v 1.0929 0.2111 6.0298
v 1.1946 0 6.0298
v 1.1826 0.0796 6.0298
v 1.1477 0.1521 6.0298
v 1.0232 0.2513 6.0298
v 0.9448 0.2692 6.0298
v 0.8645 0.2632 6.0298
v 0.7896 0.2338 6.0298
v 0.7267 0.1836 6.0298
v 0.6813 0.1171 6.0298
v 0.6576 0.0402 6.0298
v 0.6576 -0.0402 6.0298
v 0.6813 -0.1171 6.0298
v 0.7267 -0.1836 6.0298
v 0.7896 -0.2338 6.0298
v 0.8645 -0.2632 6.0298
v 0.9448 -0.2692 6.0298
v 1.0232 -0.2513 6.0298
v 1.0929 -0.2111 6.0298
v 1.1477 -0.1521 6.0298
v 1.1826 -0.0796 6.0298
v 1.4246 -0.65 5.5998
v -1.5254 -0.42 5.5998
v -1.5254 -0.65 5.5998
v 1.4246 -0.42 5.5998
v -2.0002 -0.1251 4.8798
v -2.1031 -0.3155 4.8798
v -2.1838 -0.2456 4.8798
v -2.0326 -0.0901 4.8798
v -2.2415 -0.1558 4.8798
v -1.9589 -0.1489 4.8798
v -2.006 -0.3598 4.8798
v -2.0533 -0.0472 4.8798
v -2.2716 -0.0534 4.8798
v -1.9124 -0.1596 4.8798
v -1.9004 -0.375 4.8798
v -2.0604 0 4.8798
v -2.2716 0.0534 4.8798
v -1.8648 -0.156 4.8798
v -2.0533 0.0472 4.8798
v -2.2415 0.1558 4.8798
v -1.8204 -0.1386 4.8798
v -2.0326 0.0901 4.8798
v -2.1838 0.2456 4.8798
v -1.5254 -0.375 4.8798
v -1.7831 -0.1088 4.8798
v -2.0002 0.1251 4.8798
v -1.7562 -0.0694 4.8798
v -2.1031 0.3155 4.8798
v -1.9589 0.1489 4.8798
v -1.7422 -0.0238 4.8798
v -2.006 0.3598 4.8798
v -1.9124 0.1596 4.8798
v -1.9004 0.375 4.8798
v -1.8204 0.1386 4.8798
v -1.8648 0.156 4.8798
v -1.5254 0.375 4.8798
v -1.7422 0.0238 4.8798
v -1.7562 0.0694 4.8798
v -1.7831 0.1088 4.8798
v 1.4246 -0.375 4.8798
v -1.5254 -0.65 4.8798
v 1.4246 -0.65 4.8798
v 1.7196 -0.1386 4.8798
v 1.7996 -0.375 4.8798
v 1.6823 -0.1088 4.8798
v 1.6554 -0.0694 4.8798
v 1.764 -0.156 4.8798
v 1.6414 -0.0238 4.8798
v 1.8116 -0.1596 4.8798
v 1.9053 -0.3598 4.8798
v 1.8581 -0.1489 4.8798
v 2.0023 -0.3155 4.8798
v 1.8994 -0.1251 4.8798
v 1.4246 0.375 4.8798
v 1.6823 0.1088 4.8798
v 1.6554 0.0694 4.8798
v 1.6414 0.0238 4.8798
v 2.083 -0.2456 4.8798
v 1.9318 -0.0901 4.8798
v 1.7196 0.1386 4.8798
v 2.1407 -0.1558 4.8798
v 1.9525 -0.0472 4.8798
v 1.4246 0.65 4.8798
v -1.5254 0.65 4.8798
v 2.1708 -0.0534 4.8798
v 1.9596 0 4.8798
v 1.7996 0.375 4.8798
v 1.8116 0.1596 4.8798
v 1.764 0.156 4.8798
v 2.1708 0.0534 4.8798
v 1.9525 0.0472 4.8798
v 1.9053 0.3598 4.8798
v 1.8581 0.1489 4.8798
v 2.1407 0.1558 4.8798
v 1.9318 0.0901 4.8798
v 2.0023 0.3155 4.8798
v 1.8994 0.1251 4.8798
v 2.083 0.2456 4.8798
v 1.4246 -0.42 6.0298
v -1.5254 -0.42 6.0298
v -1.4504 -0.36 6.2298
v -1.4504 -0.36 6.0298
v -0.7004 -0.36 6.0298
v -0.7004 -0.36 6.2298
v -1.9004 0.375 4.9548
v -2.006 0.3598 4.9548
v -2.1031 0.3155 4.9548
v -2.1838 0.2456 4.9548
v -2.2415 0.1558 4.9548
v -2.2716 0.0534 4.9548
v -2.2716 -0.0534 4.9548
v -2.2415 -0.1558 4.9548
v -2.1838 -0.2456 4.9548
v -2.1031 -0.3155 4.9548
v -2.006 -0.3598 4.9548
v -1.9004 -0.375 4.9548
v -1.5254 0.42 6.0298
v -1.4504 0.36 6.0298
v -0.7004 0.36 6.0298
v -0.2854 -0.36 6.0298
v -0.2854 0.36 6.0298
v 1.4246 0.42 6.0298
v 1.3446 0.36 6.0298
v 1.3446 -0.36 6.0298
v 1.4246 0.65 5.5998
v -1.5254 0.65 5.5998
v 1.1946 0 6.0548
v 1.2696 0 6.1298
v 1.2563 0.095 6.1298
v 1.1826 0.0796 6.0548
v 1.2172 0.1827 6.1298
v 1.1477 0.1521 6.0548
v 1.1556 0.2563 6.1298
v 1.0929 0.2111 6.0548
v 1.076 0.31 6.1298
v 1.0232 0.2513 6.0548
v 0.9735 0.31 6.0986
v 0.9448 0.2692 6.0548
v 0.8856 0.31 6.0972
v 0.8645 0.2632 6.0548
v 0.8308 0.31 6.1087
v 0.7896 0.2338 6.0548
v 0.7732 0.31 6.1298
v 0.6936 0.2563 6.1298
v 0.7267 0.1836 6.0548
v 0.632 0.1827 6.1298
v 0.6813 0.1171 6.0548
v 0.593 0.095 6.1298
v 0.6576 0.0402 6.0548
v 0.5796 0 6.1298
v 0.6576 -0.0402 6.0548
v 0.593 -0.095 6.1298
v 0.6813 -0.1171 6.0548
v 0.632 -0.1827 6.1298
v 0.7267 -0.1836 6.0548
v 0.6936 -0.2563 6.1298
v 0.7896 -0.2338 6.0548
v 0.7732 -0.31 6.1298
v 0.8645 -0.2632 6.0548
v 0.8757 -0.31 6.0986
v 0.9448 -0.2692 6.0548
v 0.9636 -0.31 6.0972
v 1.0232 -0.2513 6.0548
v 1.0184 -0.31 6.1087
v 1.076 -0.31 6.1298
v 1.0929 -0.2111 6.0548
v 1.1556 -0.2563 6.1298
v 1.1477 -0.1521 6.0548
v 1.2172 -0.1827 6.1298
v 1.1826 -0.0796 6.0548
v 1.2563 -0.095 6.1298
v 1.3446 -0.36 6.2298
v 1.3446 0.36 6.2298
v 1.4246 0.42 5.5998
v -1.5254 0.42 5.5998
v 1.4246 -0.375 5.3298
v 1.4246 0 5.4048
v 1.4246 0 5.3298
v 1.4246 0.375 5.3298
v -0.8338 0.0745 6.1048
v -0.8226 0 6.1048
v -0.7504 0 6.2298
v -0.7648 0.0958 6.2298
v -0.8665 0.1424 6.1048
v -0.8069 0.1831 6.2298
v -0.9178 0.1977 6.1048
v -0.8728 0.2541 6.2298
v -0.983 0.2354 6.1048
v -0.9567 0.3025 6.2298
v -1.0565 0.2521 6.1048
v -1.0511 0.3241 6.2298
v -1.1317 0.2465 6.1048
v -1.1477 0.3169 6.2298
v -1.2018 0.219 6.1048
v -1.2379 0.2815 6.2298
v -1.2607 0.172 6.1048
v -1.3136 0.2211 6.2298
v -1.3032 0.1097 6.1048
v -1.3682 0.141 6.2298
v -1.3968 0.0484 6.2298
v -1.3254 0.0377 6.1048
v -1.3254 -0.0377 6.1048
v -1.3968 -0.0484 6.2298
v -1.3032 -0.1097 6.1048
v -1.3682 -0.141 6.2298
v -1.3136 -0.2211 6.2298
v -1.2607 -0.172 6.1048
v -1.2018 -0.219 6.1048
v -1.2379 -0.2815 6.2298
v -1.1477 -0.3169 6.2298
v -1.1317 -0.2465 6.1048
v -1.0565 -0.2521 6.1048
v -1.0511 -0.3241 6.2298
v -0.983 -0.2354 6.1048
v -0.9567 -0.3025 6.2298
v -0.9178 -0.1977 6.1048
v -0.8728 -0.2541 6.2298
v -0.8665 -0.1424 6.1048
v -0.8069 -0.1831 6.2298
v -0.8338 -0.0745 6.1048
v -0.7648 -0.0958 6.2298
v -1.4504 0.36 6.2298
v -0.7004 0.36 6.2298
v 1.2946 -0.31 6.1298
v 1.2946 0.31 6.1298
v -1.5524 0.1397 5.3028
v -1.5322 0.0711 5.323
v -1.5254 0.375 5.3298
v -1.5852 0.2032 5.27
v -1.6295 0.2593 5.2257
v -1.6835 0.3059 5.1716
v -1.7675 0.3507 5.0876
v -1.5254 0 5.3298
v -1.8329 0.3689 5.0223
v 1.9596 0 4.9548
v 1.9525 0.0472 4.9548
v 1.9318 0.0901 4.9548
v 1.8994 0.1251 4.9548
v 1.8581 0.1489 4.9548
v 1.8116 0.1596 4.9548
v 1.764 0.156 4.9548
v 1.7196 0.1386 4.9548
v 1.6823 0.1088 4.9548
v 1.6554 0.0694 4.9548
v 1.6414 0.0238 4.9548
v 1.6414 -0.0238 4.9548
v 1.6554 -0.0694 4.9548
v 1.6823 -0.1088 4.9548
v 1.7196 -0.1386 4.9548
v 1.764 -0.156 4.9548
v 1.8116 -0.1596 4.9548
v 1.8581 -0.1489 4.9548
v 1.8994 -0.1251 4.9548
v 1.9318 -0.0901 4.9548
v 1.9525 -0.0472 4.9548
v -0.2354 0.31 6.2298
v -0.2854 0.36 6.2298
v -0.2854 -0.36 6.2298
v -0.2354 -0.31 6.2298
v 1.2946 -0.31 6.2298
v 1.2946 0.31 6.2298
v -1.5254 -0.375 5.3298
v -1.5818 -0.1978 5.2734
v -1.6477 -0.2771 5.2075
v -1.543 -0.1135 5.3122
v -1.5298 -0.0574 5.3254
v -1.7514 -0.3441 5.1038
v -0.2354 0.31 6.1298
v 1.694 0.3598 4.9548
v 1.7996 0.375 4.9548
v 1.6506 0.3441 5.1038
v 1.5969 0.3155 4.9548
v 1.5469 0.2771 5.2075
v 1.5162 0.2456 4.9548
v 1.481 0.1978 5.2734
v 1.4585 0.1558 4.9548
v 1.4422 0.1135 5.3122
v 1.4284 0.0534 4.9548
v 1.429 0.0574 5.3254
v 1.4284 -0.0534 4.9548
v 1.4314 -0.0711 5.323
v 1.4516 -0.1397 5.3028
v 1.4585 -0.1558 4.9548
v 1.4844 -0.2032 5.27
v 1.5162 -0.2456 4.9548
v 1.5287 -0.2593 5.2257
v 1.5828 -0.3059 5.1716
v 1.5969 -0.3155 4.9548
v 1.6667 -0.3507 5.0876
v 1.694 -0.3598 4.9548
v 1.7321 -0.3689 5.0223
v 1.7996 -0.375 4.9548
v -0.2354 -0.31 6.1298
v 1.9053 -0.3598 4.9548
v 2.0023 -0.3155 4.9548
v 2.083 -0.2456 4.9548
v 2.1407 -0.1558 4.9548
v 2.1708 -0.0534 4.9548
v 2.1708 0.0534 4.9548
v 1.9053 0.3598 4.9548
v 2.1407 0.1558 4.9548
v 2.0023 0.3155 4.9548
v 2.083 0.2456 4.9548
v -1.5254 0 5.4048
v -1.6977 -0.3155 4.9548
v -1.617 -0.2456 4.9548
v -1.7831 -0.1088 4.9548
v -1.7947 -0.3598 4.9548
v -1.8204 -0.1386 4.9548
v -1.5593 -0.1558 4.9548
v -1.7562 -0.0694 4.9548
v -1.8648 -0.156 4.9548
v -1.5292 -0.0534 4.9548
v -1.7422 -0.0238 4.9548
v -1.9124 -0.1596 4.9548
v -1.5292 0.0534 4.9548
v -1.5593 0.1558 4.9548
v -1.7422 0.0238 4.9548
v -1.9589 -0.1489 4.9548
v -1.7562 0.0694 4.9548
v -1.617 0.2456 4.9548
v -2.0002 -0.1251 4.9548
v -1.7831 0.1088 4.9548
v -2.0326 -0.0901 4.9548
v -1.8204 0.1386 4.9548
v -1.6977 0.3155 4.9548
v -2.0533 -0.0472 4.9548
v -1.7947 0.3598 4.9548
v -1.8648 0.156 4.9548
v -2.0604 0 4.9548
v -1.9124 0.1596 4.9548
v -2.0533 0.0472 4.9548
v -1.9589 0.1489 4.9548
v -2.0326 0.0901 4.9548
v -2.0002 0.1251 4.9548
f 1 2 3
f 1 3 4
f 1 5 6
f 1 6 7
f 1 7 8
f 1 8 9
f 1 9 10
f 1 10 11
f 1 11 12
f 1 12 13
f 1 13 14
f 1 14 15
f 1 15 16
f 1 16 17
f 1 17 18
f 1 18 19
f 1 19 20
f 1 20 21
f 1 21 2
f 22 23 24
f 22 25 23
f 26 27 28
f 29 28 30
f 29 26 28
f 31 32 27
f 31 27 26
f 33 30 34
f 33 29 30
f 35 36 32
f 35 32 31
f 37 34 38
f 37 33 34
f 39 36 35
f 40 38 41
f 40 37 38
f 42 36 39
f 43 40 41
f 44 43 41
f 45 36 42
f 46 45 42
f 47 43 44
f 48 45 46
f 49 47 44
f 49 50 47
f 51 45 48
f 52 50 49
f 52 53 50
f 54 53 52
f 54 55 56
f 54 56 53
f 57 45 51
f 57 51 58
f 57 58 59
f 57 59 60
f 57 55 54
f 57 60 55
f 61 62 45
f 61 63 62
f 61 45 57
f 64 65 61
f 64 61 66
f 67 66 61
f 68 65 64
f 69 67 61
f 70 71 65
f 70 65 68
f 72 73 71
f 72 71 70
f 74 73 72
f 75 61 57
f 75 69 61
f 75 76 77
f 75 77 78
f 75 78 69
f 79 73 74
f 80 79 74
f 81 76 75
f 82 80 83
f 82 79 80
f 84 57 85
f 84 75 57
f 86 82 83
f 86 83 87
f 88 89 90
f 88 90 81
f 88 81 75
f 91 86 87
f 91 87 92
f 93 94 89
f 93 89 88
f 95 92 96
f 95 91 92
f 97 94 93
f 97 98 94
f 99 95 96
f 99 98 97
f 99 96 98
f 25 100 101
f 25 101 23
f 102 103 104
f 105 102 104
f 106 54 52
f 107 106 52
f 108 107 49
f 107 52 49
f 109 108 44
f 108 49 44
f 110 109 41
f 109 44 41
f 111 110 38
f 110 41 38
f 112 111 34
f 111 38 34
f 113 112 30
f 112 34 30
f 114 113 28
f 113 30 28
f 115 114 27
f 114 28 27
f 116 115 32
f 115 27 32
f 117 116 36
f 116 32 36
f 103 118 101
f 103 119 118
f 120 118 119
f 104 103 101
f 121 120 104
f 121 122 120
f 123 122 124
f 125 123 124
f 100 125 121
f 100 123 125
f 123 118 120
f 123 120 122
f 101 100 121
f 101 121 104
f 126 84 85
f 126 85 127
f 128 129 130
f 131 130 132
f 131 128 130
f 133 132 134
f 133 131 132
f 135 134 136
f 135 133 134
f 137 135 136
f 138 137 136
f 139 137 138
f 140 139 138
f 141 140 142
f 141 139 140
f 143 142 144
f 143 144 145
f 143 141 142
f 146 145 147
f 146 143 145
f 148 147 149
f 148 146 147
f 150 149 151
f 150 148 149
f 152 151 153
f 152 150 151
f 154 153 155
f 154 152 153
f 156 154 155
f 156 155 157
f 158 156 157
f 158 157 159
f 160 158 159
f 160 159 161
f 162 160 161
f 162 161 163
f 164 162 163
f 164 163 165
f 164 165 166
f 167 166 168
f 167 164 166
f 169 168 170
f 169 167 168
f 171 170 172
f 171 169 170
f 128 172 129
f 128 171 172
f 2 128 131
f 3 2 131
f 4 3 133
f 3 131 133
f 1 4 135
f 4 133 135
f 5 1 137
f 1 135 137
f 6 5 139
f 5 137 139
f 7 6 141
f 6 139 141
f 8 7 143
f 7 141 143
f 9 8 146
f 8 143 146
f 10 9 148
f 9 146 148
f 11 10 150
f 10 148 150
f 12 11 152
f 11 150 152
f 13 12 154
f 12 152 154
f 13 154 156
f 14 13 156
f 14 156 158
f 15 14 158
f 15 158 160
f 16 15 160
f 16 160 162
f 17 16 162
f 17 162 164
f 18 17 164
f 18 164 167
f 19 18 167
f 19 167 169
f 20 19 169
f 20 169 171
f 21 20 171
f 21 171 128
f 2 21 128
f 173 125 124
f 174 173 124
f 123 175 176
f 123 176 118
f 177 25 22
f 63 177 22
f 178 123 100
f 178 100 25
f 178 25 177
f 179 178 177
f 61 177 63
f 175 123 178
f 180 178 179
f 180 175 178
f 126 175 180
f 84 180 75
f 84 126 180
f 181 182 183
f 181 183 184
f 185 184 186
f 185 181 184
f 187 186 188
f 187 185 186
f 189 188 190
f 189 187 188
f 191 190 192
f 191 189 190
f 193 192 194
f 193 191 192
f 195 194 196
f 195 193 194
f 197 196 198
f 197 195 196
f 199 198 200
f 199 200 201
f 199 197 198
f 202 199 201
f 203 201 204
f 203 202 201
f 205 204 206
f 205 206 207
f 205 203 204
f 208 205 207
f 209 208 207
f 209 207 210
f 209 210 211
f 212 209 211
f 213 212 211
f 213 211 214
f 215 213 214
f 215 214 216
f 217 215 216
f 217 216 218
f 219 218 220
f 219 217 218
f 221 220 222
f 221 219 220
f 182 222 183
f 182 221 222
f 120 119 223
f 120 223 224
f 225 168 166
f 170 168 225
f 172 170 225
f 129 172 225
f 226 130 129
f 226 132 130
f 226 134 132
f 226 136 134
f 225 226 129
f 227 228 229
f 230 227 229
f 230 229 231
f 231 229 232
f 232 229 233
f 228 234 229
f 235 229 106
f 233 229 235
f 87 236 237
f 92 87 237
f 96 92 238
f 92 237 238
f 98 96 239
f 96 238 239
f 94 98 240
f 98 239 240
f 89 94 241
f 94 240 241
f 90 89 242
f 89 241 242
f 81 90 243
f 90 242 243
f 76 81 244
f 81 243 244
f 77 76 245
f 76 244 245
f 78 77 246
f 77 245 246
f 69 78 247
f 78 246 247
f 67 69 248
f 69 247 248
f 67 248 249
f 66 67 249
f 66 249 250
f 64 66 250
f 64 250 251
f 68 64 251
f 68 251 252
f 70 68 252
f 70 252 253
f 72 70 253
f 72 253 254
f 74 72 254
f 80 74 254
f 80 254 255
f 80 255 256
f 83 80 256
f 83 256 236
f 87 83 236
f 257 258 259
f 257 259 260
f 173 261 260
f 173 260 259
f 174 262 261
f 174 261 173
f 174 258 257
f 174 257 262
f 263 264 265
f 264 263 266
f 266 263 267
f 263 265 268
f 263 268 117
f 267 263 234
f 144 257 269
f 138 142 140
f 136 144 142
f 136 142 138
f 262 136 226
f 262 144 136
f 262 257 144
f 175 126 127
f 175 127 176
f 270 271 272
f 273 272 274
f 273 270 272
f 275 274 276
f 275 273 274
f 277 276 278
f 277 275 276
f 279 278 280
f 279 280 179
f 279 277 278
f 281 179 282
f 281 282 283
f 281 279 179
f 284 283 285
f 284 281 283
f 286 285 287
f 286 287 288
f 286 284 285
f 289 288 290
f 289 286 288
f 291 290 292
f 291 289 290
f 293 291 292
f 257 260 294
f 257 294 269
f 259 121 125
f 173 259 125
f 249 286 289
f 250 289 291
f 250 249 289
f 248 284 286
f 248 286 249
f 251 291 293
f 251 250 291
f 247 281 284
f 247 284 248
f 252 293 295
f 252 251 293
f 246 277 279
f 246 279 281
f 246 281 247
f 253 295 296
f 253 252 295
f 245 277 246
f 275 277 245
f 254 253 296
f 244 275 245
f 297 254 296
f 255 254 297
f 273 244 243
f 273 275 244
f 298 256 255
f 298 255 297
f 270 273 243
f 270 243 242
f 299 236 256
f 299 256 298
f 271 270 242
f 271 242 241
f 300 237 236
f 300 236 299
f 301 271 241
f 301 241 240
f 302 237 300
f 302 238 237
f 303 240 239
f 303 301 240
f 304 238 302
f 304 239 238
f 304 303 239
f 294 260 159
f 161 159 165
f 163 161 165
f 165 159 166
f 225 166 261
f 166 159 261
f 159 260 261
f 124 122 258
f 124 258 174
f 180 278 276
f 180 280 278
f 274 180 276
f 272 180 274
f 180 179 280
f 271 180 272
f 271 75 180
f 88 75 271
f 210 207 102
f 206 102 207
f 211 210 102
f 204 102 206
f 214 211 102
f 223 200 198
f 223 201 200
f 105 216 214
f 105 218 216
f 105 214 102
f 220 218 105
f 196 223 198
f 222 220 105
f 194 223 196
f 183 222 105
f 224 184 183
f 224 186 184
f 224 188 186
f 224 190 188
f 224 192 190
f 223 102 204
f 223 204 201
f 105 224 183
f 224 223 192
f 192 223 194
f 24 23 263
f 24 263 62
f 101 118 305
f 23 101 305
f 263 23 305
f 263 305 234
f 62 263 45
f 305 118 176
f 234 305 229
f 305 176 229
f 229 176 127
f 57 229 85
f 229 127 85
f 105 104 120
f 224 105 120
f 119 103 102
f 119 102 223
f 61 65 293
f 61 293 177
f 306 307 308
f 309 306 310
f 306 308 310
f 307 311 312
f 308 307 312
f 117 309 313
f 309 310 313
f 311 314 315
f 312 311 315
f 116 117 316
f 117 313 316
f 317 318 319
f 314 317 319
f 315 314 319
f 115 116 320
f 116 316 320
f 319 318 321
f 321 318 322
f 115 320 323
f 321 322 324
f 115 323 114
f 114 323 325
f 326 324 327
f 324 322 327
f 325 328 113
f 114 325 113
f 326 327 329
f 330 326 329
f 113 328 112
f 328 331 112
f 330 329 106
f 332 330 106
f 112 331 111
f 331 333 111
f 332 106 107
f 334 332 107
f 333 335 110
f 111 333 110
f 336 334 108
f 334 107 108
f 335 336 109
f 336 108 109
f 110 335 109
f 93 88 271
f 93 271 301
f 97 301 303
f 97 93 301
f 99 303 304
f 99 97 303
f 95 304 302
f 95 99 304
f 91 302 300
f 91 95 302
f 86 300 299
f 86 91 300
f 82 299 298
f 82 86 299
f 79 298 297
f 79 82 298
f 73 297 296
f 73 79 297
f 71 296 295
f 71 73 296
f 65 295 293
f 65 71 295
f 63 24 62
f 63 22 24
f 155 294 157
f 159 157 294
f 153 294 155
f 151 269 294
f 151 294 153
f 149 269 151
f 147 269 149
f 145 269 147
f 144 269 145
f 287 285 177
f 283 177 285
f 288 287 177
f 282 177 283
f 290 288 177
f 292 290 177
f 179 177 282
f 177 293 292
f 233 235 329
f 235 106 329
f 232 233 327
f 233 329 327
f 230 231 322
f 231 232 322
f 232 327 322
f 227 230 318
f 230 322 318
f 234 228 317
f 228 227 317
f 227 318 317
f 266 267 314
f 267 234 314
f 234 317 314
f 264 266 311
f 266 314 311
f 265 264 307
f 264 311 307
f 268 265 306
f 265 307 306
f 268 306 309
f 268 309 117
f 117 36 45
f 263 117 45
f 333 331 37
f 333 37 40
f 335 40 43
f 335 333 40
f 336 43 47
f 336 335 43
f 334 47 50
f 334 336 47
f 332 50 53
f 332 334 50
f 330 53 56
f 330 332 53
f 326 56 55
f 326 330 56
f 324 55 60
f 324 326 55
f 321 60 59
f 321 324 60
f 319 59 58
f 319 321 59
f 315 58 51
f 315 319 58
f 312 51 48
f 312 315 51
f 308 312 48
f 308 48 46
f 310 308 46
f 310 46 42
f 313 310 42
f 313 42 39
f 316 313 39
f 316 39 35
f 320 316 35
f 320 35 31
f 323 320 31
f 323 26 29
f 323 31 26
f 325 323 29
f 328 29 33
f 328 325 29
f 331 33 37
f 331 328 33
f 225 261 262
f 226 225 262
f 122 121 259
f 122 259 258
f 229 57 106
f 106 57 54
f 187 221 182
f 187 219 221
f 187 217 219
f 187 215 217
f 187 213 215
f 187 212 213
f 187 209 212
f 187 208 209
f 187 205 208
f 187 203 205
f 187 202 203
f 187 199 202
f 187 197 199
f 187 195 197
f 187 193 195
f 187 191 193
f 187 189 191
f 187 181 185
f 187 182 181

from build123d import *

# Parameters (mm, degrees)
BOSS_EXTRUDE5_DEPTH = 14.75
SKETCH9_W           = 7.5
SKETCH9_H           = 7.2
SKETCH9_W_2         = 16.3
BOSS_EXTRUDE6_DEPTH = 2
SKETCH10_W          = 15.3
SKETCH10_H          = 6.2
CUT_EXTRUDE4_DEPTH  = 1
SKETCH11_R          = 2.5
CUT_EXTRUDE5_DEPTH  = 1.25
BOSS_EXTRUDE7_DEPTH = 4.5
CUT_EXTRUDE7_START  = -7.5
CUT_EXTRUDE7_DEPTH  = 7.5
SKETCH18_R          = 3.75
CUT_EXTRUDE8_DEPTH  = 4.5
SKETCH19_R          = 1.6
CUT_EXTRUDE9_DEPTH  = 4.5
CHAMFER1_SIZE       = 0.75
CHAMFER1_SIZE_2     = 1.299038106
SKETCH13_R          = 2.7
CUT_EXTRUDE6_DEPTH  = 1
CHAMFER2_SIZE       = 0.75
SCALE1_SCALE        = 0.1


# Read off the part's stored shape, not the designer's step: Cut-Extrude7
with BuildPart() as part:
    # Sketch8 → Boss-Extrude5 (new, symmetric)
    with BuildSketch(Plane(origin=(0, 0, 0), x_dir=(0, 0, -1), z_dir=(1, 0, 0))):
        Polygon((0, -6.5), (0, 6.5), (-7.2, 6.5), (-7.2, 4.2), (-11.5, 4.2), (-11.5, -4.2), (-7.2, -4.2), (-7.2, -6.5), align=None)
    extrude(amount=BOSS_EXTRUDE5_DEPTH, both=True)

    # Sketch9 → Boss-Extrude6 (add)
    with BuildSketch(Plane.XY.offset(11.5)):
        with Locations((-10.25, 0)):
            Rectangle(SKETCH9_W, SKETCH9_H)
        with Locations((5.8, 0)):
            Rectangle(SKETCH9_W_2, SKETCH9_H)
    extrude(amount=BOSS_EXTRUDE6_DEPTH)

    # Sketch10 → Cut-Extrude4 (cut)
    with BuildSketch(Plane.XY.offset(13.5)):
        with Locations((5.8, 0)):
            Rectangle(SKETCH10_W, SKETCH10_H)
    extrude(amount=-CUT_EXTRUDE4_DEPTH, mode=Mode.SUBTRACT)

    # Sketch11 → Cut-Extrude5 (cut)
    with BuildSketch(Plane.XY.offset(13.5)):
        with Locations((-10.25, 0)):
            Circle(SKETCH11_R)
    extrude(amount=-CUT_EXTRUDE5_DEPTH, mode=Mode.SUBTRACT)

    # Sketch16 → Boss-Extrude7 (add)
    with BuildSketch(Plane(origin=(0, 0, 0), x_dir=(-1, 0, 0), z_dir=(0, 0, -1))):
        with BuildLine():
            Line((-14.75, -3.75), (-14.75, 3.75))
            Line((-14.75, 3.75), (-18.5, 3.75))
            ThreePointArc((-18.5, 3.75), (-22.25, 0), (-18.5, -3.75))
            Line((-18.5, -3.75), (-14.75, -3.75))
        make_face()
    boss_extrude7 = extrude(amount=-BOSS_EXTRUDE7_DEPTH)

    # Cut-Extrude7 outline → Cut-Extrude7 (cut)
    with BuildSketch(Plane.XZ.offset(3.75).offset(CUT_EXTRUDE7_START)):
        Polygon((14.75, 4.5), (18.5, 0.75), (24, 0.75), (24, 4.5), align=None)
    cut_extrude7 = extrude(amount=CUT_EXTRUDE7_DEPTH, mode=Mode.SUBTRACT)

    # Sketch18 → Cut-Extrude8 (cut)
    with BuildSketch(Plane.XY.offset(0.75)):
        with Locations((18.5, 0)):
            Circle(SKETCH18_R)
    cut_extrude8 = extrude(amount=CUT_EXTRUDE8_DEPTH, mode=Mode.SUBTRACT)

    # Sketch19 → Cut-Extrude9 (cut)
    with BuildSketch(Plane.XY.offset(0.75)):
        with Locations((18.5, 0)):
            Circle(SKETCH19_R)
    cut_extrude9 = extrude(amount=-CUT_EXTRUDE9_DEPTH, mode=Mode.SUBTRACT)

    # Mirror1: Boss-Extrude7, Cut-Extrude7, Cut-Extrude8, Cut-Extrude9 across plane
    add(boss_extrude7.mirror(Plane(origin=(0, 0, 0), x_dir=(0, 0, 1), z_dir=(1, 0, 0))))
    add(cut_extrude7.mirror(Plane(origin=(0, 0, 0), x_dir=(0, 0, 1), z_dir=(1, 0, 0))), mode=Mode.SUBTRACT)
    add(cut_extrude8.mirror(Plane(origin=(0, 0, 0), x_dir=(0, 0, 1), z_dir=(1, 0, 0))), mode=Mode.SUBTRACT)
    add(cut_extrude9.mirror(Plane(origin=(0, 0, 0), x_dir=(0, 0, 1), z_dir=(1, 0, 0))), mode=Mode.SUBTRACT)

    # Chamfer1
    # the kernel refuses this chamfer: 1.299038106, 0.75 mm, written as the material it takes off along each edge
    with BuildSketch(Plane(origin=(-10.25, 0, 13.5), x_dir=(1, 0, 0), z_dir=(0, -1, 0))) as chamfer1_piece_1_section:
        Polygon((2.5 + CHAMFER1_SIZE, 0), (2.5, -CHAMFER1_SIZE_2), (2.5, 0), align=None)
    chamfer1_piece_1 = revolve(axis=Axis((-10.25, 0, 13.5), (0, 0, 1)), mode=Mode.PRIVATE)
    chamfer1_piece_1 = split(chamfer1_piece_1, bisect_by=Plane(origin=(-13.133837987, 0, 12.25), z_dir=(0, 0, 1)), keep=Keep.TOP, mode=Mode.PRIVATE)
    add(chamfer1_piece_1, mode=Mode.SUBTRACT)

    # Sketch13 → Cut-Extrude6 (cut)
    with BuildSketch(Plane.XY.offset(12.5)):
        with Locations((9.75, 0)):
            Circle(SKETCH13_R)
    extrude(amount=-CUT_EXTRUDE6_DEPTH, mode=Mode.SUBTRACT)

    # Chamfer2
    # the kernel refuses this chamfer: 0.75 mm, written as the material it takes off along each edge
    with BuildSketch(Plane(origin=(9.75, 0, 12.5), x_dir=(1, 0, 0), z_dir=(0, -1, 0))) as chamfer2_piece_1_section:
        Polygon((2.7 + CHAMFER2_SIZE, 0), (2.7, -CHAMFER2_SIZE), (2.7, 0), align=None)
    chamfer2_piece_1 = revolve(axis=Axis((9.75, 0, 12.5), (0, 0, 1)), mode=Mode.PRIVATE)
    chamfer2_piece_1 = split(chamfer2_piece_1, bisect_by=Plane(origin=(6.68747717, -3.1, 12.13747717), z_dir=(0, 1, 0)), keep=Keep.TOP, mode=Mode.PRIVATE)
    chamfer2_piece_1 = split(chamfer2_piece_1, bisect_by=Plane(origin=(6.68747717, 3.1, 12.13747717), z_dir=(0, -1, 0)), keep=Keep.TOP, mode=Mode.PRIVATE)
    add(chamfer2_piece_1, mode=Mode.SUBTRACT)


with BuildPart() as part_1:
    # Scale1: scaled about (-0.05599767, 0, 5.421987795)
    add(part.part.scale(SCALE1_SCALE).moved(Location((-0.050397903, 0, 4.879789016))))


solid = part_1.part
